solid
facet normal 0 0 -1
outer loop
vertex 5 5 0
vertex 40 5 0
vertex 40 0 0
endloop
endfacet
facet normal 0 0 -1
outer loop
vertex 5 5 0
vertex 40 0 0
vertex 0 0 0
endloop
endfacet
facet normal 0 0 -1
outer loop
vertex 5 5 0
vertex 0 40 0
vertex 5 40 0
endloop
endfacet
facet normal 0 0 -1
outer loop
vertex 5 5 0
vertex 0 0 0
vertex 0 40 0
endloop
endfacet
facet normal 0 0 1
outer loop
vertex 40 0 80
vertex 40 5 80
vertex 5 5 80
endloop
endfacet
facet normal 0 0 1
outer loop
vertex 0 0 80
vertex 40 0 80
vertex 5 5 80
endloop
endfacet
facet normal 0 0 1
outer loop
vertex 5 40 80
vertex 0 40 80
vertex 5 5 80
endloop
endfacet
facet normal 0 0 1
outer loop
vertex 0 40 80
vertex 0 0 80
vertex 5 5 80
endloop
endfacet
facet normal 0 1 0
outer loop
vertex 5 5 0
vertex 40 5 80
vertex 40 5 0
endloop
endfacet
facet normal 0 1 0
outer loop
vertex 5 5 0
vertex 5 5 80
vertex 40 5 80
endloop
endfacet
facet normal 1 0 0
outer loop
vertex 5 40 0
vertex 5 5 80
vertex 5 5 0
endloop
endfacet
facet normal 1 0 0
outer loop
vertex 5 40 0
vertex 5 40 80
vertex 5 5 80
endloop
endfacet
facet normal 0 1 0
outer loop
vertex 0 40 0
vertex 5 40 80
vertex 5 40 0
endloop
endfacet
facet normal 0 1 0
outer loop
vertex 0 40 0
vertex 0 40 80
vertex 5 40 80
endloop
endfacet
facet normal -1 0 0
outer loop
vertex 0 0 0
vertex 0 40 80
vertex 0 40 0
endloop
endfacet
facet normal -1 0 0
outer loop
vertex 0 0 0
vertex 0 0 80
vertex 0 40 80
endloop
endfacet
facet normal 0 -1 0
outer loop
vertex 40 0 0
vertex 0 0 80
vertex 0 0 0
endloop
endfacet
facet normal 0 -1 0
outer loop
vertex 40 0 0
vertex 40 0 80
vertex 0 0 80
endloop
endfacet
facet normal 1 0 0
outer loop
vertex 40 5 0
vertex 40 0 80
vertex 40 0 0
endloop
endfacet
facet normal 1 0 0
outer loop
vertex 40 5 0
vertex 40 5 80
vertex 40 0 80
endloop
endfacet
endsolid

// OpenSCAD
$fn = 32;

// ----------------------------------------------------------------------
// Structural section: angle 40 x 40 mm
// ----------------------------------------------------------------------

// --- parameters (mm) ---
sec_w = 40;               // leg width, X
sec_h = 40;               // leg height, Y
flange_t = 5;             // leg thickness
plate_t = 80;             // cut length, Z (extrusion height)
fit_tol = 0.02;           // declared fit tolerance (prompt contract)
free_tol = 0.2;           // declared free tolerance (prompt contract)

profile = [[0, 0], [40, 0], [40, 5], [5, 5], [5, 40], [0, 40]];  // primary outline, 6 points, counter clockwise

// --- the one profile operation ---
linear_extrude(height = plate_t) polygon(points = profile);
